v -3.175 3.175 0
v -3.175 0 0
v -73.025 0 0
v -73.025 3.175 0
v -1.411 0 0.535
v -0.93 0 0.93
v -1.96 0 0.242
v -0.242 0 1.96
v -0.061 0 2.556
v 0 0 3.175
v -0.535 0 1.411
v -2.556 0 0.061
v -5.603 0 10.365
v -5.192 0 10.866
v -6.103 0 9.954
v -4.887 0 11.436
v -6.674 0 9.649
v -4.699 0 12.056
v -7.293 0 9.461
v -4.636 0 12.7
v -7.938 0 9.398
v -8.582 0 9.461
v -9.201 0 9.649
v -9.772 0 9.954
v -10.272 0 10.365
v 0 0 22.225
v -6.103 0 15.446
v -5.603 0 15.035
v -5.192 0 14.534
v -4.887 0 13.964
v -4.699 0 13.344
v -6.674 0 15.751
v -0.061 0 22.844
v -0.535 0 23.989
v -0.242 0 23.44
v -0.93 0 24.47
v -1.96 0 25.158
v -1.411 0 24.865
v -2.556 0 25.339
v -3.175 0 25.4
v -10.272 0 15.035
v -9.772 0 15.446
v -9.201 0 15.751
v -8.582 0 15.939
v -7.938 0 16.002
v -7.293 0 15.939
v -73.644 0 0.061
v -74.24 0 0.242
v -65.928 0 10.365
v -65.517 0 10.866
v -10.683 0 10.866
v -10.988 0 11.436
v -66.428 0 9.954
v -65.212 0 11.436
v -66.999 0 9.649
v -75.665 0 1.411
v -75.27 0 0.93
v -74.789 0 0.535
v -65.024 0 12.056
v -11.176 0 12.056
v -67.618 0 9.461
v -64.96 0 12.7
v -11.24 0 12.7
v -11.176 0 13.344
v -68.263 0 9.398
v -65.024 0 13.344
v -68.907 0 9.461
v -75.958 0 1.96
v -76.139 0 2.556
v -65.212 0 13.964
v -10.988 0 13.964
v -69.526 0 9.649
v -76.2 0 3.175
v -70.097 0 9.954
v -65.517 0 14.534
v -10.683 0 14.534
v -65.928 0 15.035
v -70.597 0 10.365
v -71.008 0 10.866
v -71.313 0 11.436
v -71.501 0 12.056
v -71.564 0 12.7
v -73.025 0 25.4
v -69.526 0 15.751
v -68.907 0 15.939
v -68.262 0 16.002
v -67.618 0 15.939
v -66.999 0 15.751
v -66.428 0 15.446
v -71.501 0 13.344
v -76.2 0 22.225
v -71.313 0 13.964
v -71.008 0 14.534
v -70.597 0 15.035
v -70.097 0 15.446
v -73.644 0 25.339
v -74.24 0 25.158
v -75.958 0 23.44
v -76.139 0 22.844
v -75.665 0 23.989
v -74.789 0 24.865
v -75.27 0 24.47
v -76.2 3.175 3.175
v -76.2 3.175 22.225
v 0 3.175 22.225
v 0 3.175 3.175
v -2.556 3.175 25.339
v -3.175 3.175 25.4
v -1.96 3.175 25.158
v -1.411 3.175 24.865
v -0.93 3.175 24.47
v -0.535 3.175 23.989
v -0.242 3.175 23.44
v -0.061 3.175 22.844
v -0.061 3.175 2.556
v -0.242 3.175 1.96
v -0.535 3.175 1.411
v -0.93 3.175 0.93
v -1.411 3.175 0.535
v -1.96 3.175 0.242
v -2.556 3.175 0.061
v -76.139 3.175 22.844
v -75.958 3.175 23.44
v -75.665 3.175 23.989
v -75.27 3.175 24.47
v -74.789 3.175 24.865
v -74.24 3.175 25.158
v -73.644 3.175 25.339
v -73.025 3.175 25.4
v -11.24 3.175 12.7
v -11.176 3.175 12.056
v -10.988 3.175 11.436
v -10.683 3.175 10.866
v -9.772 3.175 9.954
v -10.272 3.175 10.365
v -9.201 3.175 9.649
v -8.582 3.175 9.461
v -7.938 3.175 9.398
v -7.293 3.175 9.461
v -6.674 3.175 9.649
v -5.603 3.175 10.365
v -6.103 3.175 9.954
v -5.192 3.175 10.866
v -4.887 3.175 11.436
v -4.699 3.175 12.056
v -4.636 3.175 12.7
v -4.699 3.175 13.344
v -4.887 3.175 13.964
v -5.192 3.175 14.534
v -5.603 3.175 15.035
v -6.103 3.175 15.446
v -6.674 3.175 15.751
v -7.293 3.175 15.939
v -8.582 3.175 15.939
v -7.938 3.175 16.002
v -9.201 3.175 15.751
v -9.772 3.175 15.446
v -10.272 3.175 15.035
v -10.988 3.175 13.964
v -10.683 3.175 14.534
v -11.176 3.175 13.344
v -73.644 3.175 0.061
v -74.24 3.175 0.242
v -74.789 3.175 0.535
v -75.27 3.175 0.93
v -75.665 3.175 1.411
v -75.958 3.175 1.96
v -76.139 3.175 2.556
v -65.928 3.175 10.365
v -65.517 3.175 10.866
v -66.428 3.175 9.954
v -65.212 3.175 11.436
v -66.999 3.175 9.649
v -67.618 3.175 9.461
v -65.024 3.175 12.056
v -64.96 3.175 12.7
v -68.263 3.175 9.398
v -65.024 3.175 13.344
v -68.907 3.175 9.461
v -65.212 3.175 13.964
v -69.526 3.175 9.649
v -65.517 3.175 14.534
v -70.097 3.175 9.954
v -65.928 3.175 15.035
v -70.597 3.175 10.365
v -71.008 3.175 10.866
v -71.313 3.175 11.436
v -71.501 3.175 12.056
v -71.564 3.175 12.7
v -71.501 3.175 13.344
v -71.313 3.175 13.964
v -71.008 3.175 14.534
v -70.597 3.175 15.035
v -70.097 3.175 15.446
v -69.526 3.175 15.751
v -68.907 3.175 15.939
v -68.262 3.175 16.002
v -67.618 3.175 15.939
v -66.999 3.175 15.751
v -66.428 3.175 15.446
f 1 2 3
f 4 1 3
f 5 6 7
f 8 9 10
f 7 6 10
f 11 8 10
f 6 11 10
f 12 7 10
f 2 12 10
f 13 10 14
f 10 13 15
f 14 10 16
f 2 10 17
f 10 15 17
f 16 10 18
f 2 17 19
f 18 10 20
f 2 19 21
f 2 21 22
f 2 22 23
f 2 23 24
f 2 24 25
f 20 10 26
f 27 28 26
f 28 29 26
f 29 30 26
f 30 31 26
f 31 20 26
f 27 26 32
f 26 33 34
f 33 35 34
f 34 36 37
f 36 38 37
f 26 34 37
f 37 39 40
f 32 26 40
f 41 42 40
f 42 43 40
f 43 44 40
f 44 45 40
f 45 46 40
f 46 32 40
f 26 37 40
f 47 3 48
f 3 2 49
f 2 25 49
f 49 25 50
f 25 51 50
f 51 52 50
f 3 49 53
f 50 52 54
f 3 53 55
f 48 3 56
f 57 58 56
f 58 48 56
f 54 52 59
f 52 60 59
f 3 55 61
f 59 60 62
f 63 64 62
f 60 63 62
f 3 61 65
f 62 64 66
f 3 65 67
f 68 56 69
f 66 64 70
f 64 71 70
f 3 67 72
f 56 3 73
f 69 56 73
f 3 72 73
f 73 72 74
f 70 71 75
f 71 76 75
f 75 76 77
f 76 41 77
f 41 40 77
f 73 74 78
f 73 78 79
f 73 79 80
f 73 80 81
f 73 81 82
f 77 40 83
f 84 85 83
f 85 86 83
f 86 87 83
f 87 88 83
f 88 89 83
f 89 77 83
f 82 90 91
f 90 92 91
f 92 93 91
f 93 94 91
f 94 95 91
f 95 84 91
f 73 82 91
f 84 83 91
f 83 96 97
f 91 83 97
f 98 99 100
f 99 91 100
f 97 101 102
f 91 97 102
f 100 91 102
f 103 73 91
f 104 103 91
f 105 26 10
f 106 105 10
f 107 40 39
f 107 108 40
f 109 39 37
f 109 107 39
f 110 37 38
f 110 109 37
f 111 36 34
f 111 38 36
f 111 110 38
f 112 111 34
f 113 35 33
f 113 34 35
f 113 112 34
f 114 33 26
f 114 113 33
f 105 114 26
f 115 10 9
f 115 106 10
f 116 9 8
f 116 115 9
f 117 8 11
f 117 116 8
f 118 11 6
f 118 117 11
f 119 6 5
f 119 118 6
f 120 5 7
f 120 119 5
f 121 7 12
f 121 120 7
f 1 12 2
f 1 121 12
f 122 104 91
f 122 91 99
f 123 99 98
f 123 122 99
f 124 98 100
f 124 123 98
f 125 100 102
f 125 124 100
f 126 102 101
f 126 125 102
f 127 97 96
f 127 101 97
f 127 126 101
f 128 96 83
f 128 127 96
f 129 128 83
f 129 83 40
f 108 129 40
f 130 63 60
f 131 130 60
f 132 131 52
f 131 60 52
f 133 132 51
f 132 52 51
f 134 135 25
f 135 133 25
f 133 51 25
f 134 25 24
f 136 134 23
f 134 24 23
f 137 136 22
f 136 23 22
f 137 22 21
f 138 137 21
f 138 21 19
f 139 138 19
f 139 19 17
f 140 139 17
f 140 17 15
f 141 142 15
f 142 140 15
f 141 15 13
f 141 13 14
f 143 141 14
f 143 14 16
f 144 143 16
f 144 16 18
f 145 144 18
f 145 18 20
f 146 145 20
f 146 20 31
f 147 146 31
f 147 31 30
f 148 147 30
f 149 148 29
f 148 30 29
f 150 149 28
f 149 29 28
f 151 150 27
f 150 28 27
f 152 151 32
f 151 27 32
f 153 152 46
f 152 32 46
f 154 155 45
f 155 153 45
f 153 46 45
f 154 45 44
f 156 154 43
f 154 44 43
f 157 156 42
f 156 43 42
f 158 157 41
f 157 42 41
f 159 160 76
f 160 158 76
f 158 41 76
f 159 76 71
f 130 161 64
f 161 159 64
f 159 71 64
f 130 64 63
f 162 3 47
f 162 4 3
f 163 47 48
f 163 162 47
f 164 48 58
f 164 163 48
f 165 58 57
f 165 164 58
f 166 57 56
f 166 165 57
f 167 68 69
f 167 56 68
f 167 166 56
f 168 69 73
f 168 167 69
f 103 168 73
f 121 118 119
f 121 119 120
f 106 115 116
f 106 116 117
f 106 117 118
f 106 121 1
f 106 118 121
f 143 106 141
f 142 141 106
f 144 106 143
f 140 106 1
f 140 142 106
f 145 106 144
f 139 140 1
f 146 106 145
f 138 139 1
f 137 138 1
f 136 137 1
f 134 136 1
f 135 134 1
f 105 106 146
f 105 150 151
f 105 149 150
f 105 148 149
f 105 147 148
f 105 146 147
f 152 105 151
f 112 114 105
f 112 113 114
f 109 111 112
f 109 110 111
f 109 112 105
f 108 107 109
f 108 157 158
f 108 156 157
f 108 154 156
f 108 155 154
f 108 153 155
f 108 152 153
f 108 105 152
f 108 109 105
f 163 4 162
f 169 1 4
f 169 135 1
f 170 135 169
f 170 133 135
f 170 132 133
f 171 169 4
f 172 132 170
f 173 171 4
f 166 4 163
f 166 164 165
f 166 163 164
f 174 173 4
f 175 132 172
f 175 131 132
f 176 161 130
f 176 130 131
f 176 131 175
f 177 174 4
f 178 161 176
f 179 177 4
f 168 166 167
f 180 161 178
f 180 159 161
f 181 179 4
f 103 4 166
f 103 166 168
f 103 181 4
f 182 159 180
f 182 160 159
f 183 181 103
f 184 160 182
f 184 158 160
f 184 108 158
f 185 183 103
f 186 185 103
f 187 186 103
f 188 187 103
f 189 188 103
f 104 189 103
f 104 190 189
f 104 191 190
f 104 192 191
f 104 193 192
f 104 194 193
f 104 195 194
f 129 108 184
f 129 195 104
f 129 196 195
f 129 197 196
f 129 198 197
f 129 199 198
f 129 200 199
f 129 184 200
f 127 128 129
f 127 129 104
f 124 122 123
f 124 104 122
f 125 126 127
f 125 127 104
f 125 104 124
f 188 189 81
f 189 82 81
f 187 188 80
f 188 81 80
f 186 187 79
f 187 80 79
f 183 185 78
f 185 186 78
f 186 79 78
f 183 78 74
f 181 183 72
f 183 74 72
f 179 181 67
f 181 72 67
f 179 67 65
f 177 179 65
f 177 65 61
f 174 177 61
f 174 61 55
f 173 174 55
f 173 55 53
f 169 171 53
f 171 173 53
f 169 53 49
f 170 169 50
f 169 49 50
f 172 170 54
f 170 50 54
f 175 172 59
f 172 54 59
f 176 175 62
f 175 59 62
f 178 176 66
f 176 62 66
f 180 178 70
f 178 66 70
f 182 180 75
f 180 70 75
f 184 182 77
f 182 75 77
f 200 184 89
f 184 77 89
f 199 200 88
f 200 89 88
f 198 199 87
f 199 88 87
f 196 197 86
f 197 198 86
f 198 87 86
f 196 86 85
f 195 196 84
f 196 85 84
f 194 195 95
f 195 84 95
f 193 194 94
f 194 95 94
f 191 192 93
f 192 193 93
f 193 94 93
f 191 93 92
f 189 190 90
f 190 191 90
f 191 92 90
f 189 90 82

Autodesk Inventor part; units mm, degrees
ref_plane "YZ Plane" through (0, 0, 0) normal (1, 0, 0) x (0, 1, 0)
ref_plane "XZ Plane" through (0, 0, 0) normal (0, 1, 0) x (-1, 0, 0)
ref_plane "XY Plane" through (0, 0, 0) normal (0, 0, 1) x (1, 0, 0)
sketch "Sketch1" plane through (0, 0, 0) normal (0, 1, 0) x (-1, 0, 0)
  line L0 (0, 0) -> (76.2, 0)
  line L1 (76.2, 0) -> (76.2, 25.4)
  line L2 (76.2, 25.4) -> (0, 25.4)
  line L3 (0, 25.4) -> (0, 0)
  line L4 (7.9375, 12.7) -> (68.2625, 12.7) construction
  circle A0 centre (7.9375, 12.7) radius 3.302
  circle A1 centre (68.2625, 12.7) radius 3.302
  line L5 (38.1, 25.4) -> (38.1, 0) construction
  point P0 (38.1, 12.7)
  dimension "d0" = 76.2
  dimension "d1" = 6.604
  dimension "d2" = 60.325
  dimension "d3" = 25.4
extrude "Extrusion1" add sketch "Sketch1" along normal blind 3.175
fillet "Fillet1" radius 3.175 4 edges at (0, 1.5875, 25.4) (0, 1.5875, 0) (-76.2, 1.5875, 25.4) (-76.2, 1.5875, 0)
properties part number "Wheel Mount Support Plate - drive wheel" material "Aluminum 6061"
